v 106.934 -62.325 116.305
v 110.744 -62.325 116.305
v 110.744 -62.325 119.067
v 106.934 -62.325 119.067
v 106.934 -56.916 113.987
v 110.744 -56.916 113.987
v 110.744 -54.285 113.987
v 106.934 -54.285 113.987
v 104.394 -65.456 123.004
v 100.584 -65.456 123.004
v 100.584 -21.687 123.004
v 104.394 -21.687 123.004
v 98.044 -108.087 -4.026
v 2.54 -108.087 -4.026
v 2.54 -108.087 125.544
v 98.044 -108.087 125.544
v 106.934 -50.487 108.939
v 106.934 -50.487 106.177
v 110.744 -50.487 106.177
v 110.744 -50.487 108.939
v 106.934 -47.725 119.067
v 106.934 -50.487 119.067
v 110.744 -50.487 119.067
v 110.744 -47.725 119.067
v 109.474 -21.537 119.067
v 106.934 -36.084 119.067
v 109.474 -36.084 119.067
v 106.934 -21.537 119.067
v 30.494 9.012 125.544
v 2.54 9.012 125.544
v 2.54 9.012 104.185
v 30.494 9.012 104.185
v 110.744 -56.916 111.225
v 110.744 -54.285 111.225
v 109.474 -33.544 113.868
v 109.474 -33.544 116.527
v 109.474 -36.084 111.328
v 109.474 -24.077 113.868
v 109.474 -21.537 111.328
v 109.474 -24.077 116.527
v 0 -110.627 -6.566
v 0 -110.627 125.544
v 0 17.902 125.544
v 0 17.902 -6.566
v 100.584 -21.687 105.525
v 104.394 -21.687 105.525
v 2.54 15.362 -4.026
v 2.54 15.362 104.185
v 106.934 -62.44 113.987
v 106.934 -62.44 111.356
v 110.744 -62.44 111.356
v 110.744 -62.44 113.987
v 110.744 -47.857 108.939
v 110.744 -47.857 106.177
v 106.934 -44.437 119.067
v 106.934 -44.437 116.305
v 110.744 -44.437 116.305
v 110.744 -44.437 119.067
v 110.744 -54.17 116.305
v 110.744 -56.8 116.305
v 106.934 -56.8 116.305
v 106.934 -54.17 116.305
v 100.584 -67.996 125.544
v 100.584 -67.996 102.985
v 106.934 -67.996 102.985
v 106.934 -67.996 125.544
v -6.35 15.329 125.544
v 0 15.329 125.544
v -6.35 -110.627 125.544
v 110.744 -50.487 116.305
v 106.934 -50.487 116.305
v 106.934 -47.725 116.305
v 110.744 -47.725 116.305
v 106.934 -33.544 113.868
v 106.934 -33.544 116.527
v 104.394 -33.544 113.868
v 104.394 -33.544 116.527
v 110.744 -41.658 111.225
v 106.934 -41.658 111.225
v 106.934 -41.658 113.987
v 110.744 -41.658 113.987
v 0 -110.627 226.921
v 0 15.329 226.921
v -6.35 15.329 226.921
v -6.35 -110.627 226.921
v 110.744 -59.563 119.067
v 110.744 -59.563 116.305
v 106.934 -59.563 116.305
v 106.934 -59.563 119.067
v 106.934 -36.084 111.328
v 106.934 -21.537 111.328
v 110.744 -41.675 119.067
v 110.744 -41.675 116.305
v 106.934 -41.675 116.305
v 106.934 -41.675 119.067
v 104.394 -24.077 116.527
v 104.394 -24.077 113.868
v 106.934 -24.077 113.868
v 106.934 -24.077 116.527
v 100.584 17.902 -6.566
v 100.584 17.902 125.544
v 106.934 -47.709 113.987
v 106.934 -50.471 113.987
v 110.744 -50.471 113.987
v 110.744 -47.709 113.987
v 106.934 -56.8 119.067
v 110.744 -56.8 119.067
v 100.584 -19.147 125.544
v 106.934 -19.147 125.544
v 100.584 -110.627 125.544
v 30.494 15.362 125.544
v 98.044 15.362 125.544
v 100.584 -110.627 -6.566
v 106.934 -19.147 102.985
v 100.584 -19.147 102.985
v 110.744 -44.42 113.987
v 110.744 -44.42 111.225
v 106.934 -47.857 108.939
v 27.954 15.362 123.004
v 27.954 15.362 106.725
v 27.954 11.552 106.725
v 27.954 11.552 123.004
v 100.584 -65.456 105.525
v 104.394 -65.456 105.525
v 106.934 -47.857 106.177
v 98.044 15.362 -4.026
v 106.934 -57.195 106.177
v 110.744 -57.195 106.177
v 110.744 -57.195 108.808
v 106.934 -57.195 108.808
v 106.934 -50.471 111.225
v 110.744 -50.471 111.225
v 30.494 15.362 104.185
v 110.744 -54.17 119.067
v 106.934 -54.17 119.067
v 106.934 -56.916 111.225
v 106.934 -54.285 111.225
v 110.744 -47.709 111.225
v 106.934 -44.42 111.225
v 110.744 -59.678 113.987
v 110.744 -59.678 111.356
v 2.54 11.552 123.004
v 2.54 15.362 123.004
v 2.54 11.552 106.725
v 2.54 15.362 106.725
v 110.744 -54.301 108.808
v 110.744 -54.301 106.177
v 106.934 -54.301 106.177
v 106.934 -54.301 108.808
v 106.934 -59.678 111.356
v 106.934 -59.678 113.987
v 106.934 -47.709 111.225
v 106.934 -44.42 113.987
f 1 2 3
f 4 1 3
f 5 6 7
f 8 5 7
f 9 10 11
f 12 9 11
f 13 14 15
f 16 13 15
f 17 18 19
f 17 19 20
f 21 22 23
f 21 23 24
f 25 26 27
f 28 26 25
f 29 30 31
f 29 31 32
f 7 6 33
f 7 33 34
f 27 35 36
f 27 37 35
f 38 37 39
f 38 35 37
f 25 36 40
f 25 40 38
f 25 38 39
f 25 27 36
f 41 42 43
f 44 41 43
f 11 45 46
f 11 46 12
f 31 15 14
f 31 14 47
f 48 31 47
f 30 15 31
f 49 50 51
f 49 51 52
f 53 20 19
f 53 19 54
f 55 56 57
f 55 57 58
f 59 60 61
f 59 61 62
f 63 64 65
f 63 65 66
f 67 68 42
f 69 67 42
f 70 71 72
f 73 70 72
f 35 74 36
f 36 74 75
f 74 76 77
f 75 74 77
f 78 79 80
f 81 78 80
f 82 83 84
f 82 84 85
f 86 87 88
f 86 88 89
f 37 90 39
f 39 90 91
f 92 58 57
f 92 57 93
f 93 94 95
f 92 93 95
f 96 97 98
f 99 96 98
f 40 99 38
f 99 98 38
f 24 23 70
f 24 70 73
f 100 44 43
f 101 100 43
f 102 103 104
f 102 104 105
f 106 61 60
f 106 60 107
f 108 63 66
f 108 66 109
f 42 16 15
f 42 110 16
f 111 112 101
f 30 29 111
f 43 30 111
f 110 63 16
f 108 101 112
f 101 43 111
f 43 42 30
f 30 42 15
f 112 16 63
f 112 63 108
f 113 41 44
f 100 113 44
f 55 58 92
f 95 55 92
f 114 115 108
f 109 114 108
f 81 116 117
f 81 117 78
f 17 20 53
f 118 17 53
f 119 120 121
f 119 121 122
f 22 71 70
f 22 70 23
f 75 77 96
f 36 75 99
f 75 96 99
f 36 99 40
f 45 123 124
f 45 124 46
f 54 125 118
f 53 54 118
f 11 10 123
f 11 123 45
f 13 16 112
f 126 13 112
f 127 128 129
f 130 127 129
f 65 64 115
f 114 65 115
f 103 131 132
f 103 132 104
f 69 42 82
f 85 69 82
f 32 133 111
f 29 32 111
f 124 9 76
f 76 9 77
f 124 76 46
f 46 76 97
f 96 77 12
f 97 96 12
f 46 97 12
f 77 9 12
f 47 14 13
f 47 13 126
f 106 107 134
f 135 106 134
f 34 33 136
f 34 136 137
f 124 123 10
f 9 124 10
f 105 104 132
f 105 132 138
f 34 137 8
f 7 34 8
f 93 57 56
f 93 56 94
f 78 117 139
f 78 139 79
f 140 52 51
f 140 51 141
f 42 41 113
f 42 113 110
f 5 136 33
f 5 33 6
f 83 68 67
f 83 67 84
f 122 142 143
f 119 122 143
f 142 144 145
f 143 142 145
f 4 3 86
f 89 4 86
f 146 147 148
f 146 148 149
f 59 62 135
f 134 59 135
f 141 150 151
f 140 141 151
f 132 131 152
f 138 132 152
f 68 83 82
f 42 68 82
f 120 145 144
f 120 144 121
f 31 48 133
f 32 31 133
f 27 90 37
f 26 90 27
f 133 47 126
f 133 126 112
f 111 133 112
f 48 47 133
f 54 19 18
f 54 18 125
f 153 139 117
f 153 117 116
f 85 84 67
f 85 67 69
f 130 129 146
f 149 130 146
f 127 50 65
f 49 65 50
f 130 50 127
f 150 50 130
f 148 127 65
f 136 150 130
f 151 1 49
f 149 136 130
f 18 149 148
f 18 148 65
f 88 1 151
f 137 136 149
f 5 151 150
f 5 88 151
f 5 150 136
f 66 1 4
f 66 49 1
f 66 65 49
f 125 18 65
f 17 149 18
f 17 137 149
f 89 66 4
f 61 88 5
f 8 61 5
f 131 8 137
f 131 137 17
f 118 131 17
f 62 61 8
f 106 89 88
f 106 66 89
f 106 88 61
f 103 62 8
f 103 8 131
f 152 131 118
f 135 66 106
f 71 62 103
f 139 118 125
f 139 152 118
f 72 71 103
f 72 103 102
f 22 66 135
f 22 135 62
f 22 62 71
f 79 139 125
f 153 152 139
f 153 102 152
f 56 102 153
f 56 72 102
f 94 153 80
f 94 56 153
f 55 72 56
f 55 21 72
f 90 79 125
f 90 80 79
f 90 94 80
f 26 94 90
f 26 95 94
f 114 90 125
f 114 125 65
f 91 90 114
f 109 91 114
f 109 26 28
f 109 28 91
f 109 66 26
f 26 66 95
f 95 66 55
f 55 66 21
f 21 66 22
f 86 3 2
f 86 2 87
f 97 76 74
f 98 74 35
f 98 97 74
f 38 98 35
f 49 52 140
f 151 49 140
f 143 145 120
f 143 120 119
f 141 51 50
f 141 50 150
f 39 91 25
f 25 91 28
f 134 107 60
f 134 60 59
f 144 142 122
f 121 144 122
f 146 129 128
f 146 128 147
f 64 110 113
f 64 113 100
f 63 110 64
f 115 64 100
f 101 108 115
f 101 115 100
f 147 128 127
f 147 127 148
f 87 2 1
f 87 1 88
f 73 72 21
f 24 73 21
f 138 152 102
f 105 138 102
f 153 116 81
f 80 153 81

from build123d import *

# Parameters (mm, degrees)
F0_W          = 128.5288762301
F0_H          = 132.1100722998
F1_DEPTH      = 100.584
F2_T          = -2.54
F3_W          = 125.9559132159
F3_H          = 101.376414299
F4_DEPTH      = 6.35
F5_W          = 27.9540398782
F5_H          = 21.3589221239
F6_DEPTH      = 6.35
F7_W          = 48.8489195704
F7_H          = 22.5596278906
F8_DEPTH      = 6.35
F9_W          = 2.762068063
F9_H          = 2.7620643377
F9_W_2        = 2.6305429637
F9_H_2        = 2.7620717883
F9_W_3        = 2.7620717883
F9_W_4        = 2.630546689
F9_W_5        = 2.8935968876
F9_H_3        = 2.630546689
F9_H_4        = 2.6305392385
F10_DEPTH     = 3.81
F11_W         = 15.6517345458
F11_H         = 4.7349780798
F12_DEPTH     = 5.08
F13_W         = 14.5478118211
F13_H         = 7.7390819788
F14_DEPTH     = 2.54
F15_T         = 2.54
F15_T3_DEPTH  = 27.6396278906
F15_T5_DEPTH  = 53.9289195704
F15_T7_DEPTH  = 7.9735968876
F15_T9_DEPTH  = 7.710546689
F15_T11_DEPTH = 7.710546689
F15_T13_DEPTH = 7.8420717883
F15_T15_DEPTH = 7.7105429637
F15_T17_DEPTH = 7.8420717883
F15_T19_DEPTH = 7.8420717883
F15_T21_DEPTH = 7.842068063
F15_T23_DEPTH = 7.842068063
F15_T25_DEPTH = 7.7105392385
F15_T27_DEPTH = 7.842068063
F15_T29_DEPTH = 7.8420643377
F15_T31_DEPTH = 7.7105429637
F15_T33_DEPTH = 7.8420717883
F15_T35_DEPTH = 7.8420717883
F15_T37_DEPTH = 7.842068063
F15_T39_DEPTH = 19.6278118211
F15_T41_DEPTH = 12.8190819788
F15_T43_DEPTH = 134.6500722998
F15_T45_DEPTH = 100.584
F15_T47_DEPTH = 113.2911501759
F15_T49_DEPTH = 33.0340398782
F15_T51_DEPTH = 26.4389221239
F15_T53_DEPTH = 11.43
F15_T55_DEPTH = 128.5288762301


# Not quite as in the source:
# - a shell that OpenCascade refuses in one call is made with other operations: the cavity is built on its own and cut out


with BuildPart() as f1:
    # F0 (on Right) → F1 (new body)
    with BuildSketch(Plane.YZ):
        with Locations((-46.36219237, 59.4891095534)):
            Rectangle(F0_W, F0_H)
    extrude(amount=F1_DEPTH)

    # F2
    f2_openings = [f1.faces().sort_by_distance(p)[0] for p in [
        (50.292, -46.362192, 125.544146),
    ]]
    offset(amount=F2_T, openings=f2_openings)

    # F5 (on face) → F6 (join)
    with BuildSketch(Plane.XZ.offset(-15.3622457451)):
        with Locations((16.5170199391, 114.8646846414)):
            Rectangle(F5_W, F5_H)
    extrude(amount=F6_DEPTH)

    # F7 (on face) → F8 (join)
    with BuildSketch(Plane.YZ.offset(100.584)):
        with Locations((-43.5713417828, 114.264331758)):
            Rectangle(F7_W, F7_H)
    extrude(amount=F8_DEPTH)

    # F9 (on face) → F10 (join)
    with BuildSketch(Plane.YZ.offset(106.934)):
        with Locations((-60.9435793012, 117.6858767867)):
            Rectangle(F9_W, F9_H)
        with Locations((-55.4852019995, 117.6858730614)):
            Rectangle(F9_W_2, F9_H_2)
        with Locations((-49.1061359644, 117.6858730614)):
            Rectangle(F9_W_3, F9_H_2)
        with Locations((-43.0558864027, 117.6858730614)):
            Rectangle(F9_W, F9_H_2)
        with Locations((-43.0394452997, 112.6056425273)):
            Rectangle(F9_W, F9_H_2)
        with Locations((-49.0896948613, 112.6056425273)):
            Rectangle(F9_W_3, F9_H_2)
        with Locations((-49.171898514, 107.5582839549)):
            Rectangle(F9_W_4, F9_H_2)
        with Locations((-55.748257786, 107.4925214052)):
            Rectangle(F9_W_5, F9_H_3)
        with Locations((-55.600289721, 112.6056425273)):
            Rectangle(F9_W_2, F9_H_2)
        with Locations((-61.0586670227, 112.6714088023)):
            Rectangle(F9_W, F9_H_4)
    extrude(amount=F10_DEPTH)

    # F11 (on face) → F12 (join)
    with BuildSketch(Plane.YZ.offset(106.934)):
        with Locations((-28.7194242701, 116.8309524655)):
            Rectangle(F11_W, F11_H)
    extrude(amount=-F12_DEPTH)

    # F13 (on face) → F14 (join)
    with BuildSketch(Plane.YZ.offset(106.934)):
        with Locations((-28.8104629144, 115.1973679662)):
            Rectangle(F13_W, F13_H)
    extrude(amount=F14_DEPTH)

    # F15: shell of thickness 2.54, made by hand


with BuildPart() as f4:
    # F3 (on face) → F4 (new body)
    with BuildSketch(Plane(origin=(0, 0, 0), x_dir=(0, -1, 0), z_dir=(-1, 0, 0))):
        with Locations((47.6486738771, 176.2323528528)):
            Rectangle(F3_W, F3_H)
    extrude(amount=F4_DEPTH)


with BuildPart() as f15_core1:
    # F15_t2: copy of F1
    add(f1.part)

    # the walls: a layer under each face that stays
    f15_faces = [f15_core1.faces().sort_by_distance(p)[0] for p in [
        (50.292, -110.6266304851, 59.4891095534),
        (99.2958571429, 8.7216117286, 125.5441457033),
        (50.292, -46.36219237, -6.5659265965),
        (0, -46.36219237, 59.4891095534),
        (100.584, -46.36219237, 59.4891095534),
        (50.292, 17.9022457451, 59.4891095534),
        (103.759, -19.1468819976, 114.264331758),
        (106.934, -43.5713417828, 114.264331758),
        (103.759, -67.995801568, 114.264331758),
        (50.292, 15.3622457451, 60.7591095534),
        (30.4940398782, 12.1872457451, 114.8646846414),
        (16.5170199391, 9.0122457451, 114.8646846414),
        (2.54, -46.36219237, 60.7591095534),
        (50.292, -108.0866304851, 60.7591095534),
        (98.044, -46.36219237, 60.7591095534),
        (103.759, -43.5713417828, 102.9845178127),
        (108.839, -55.748257786, 108.8077947497),
        (108.839, -54.3014593422, 107.4925214052),
        (108.839, -57.1950562298, 107.4925214052),
        (108.839, -55.748257786, 106.1772480607),
        (108.839, -49.171898514, 108.939319849),
        (108.839, -47.8566251695, 107.5582839549),
        (108.839, -50.4871718585, 107.5582839549),
        (108.839, -49.171898514, 106.1772480607),
        (108.839, -55.600289721, 113.9866784215),
        (108.839, -54.2850182392, 112.6056425273),
        (108.839, -56.9155612029, 112.6056425273),
        (108.839, -55.600289721, 111.2246066332),
        (108.839, -49.0896948613, 113.9866784215),
        (108.839, -47.7086589672, 112.6056425273),
        (108.839, -50.4707307555, 112.6056425273),
        (108.839, -49.0896948613, 111.2246066332),
        (108.839, -43.0394452997, 113.9866784215),
        (108.839, -41.6584112681, 112.6056425273),
        (108.839, -44.4204793312, 112.6056425273),
        (108.839, -43.0394452997, 111.2246066332),
        (108.839, -61.0586670227, 111.356139183),
        (108.839, -62.4397010542, 112.6714088023),
        (108.839, -59.6776329912, 112.6714088023),
        (108.839, -61.0586670227, 113.9866784215),
        (108.839, -60.9435793012, 119.0669089556),
        (108.839, -59.5625452697, 117.6858767867),
        (108.839, -62.3246133327, 117.6858767867),
        (108.839, -60.9435793012, 116.3048446178),
        (108.839, -55.4852019995, 119.0669089556),
        (108.839, -54.1699305177, 117.6858730614),
        (108.839, -56.8004734814, 117.6858730614),
        (108.839, -55.4852019995, 116.3048371673),
        (108.839, -49.1061359644, 119.0669089556),
        (108.839, -47.7251000702, 117.6858730614),
        (108.839, -50.4871718585, 117.6858730614),
        (108.839, -49.1061359644, 116.3048371673),
        (108.839, -43.0558864027, 119.0669089556),
        (108.839, -41.6748523712, 117.6858730614),
        (108.839, -44.4369204342, 117.6858730614),
        (108.839, -43.0558864027, 116.3048371673),
        (108.204, -28.8104629144, 119.0669089556),
        (108.204, -36.084368825, 115.1973679662),
        (108.204, -28.8104629144, 111.3278269768),
        (108.204, -21.5365570039, 115.1973679662),
        (50.292, -46.36219237, -4.0259265965),
        (16.5170199391, 12.1872457451, 104.1852235794),
        (110.744, -55.748257786, 107.4925214052),
        (110.744, -49.171898514, 107.5582839549),
        (110.744, -55.600289721, 112.6056425273),
        (110.744, -49.0896948613, 112.6056425273),
        (110.744, -43.0394452997, 112.6056425273),
        (110.744, -61.0586670227, 112.6714088023),
        (110.744, -60.9435793012, 117.6858767867),
        (110.744, -55.4852019995, 117.6858730614),
        (110.744, -49.1061359644, 117.6858730614),
        (110.744, -43.0558864027, 117.6858730614),
    ]]
    thicken(f15_faces, amount=-F15_T, mode=Mode.SUBTRACT)

    # F15_s4 → F15_t3 (cut)
    with BuildSketch(Plane.XY.offset(100.4445178127)):
        Polygon((100.6094, -68.021201568), (98.044, -67.995801568), (98.044, -65.455801568), (100.584, -65.455801568), align=None)
        Polygon((100.6094, -19.1214819976), (98.044, -19.1468819976), (98.044, -21.6868819976), (100.584, -21.6868819976), align=None)
    extrude(amount=F15_T3_DEPTH, mode=Mode.SUBTRACT)

    # F15_s6 → F15_t5 (cut)
    with BuildSketch(Plane.XZ.offset(16.6068819976)):
        Polygon((100.6094, 102.9591178127), (98.044, 102.9845178127), (98.044, 105.5245178127), (100.584, 105.5245178127), align=None)
    extrude(amount=F15_T5_DEPTH, mode=Mode.SUBTRACT)

    # F15_s8 → F15_t7 (cut)
    with BuildSketch(Plane.XZ.offset(51.7614593422)):
        Polygon((106.9594, 108.8331947497), (104.394, 108.8077947497), (104.394, 106.2677947497), (106.934, 106.2677947497), align=None)
        Polygon((106.9594, 106.1518480607), (104.394, 106.1772480607), (104.394, 108.7172480607), (106.934, 108.7172480607), align=None)
    extrude(amount=F15_T7_DEPTH, mode=Mode.SUBTRACT)

    # F15_s10 → F15_t9 (cut)
    with BuildSketch(Plane.XY.offset(103.6372480607)):
        Polygon((106.9594, -54.2760593422), (104.394, -54.3014593422), (104.394, -56.8414593422), (106.934, -56.8414593422), align=None)
        Polygon((106.9594, -57.2204562298), (104.394, -57.1950562298), (104.394, -54.6550562298), (106.934, -54.6550562298), align=None)
    extrude(amount=F15_T9_DEPTH, mode=Mode.SUBTRACT)

    # F15_s12 → F15_t11 (cut)
    with BuildSketch(Plane.XZ.offset(45.3166251695)):
        Polygon((106.9594, 108.964719849), (104.394, 108.939319849), (104.394, 106.399319849), (106.934, 106.399319849), align=None)
        Polygon((106.9594, 106.1518480607), (104.394, 106.1772480607), (104.394, 108.7172480607), (106.934, 108.7172480607), align=None)
    extrude(amount=F15_T11_DEPTH, mode=Mode.SUBTRACT)

    # F15_s14 → F15_t13 (cut)
    with BuildSketch(Plane.XY.offset(103.6372480607)):
        Polygon((106.9594, -47.8312251695), (104.394, -47.8566251695), (104.394, -50.3966251695), (106.934, -50.3966251695), align=None)
        Polygon((106.9594, -50.5125718585), (104.394, -50.4871718585), (104.394, -47.9471718585), (106.934, -47.9471718585), align=None)
    extrude(amount=F15_T13_DEPTH, mode=Mode.SUBTRACT)

    # F15_s16 → F15_t15 (cut)
    with BuildSketch(Plane.XZ.offset(51.7450182392)):
        Polygon((106.9594, 114.0120784215), (104.394, 113.9866784215), (104.394, 111.4466784215), (106.934, 111.4466784215), align=None)
        Polygon((106.9594, 111.1992066332), (104.394, 111.2246066332), (104.394, 113.7646066332), (106.934, 113.7646066332), align=None)
    extrude(amount=F15_T15_DEPTH, mode=Mode.SUBTRACT)

    # F15_s18 → F15_t17 (cut)
    with BuildSketch(Plane.XY.offset(108.6846066332)):
        Polygon((106.9594, -54.2596182392), (104.394, -54.2850182392), (104.394, -56.8250182392), (106.934, -56.8250182392), align=None)
        Polygon((106.9594, -56.9409612029), (104.394, -56.9155612029), (104.394, -54.3755612029), (106.934, -54.3755612029), align=None)
        Polygon((106.9594, -47.6832589672), (104.394, -47.7086589672), (104.394, -50.2486589672), (106.934, -50.2486589672), align=None)
        Polygon((106.9594, -50.4961307555), (104.394, -50.4707307555), (104.394, -47.9307307555), (106.934, -47.9307307555), align=None)
        Polygon((106.9594, -41.6330112681), (104.394, -41.6584112681), (104.394, -44.1984112681), (106.934, -44.1984112681), align=None)
        Polygon((106.9594, -44.4458793312), (104.394, -44.4204793312), (104.394, -41.8804793312), (106.934, -41.8804793312), align=None)
    extrude(amount=F15_T17_DEPTH, mode=Mode.SUBTRACT)

    # F15_s20 → F15_t19 (cut)
    with BuildSketch(Plane.XZ.offset(45.1686589672)):
        Polygon((106.9594, 114.0120784215), (104.394, 113.9866784215), (104.394, 111.4466784215), (106.934, 111.4466784215), align=None)
        Polygon((106.9594, 111.1992066332), (104.394, 111.2246066332), (104.394, 113.7646066332), (106.934, 113.7646066332), align=None)
    extrude(amount=F15_T19_DEPTH, mode=Mode.SUBTRACT)

    # F15_s22 → F15_t21 (cut)
    with BuildSketch(Plane.XZ.offset(39.1184112681)):
        Polygon((106.9594, 114.0120784215), (104.394, 113.9866784215), (104.394, 111.4466784215), (106.934, 111.4466784215), align=None)
        Polygon((106.9594, 111.1992066332), (104.394, 111.2246066332), (104.394, 113.7646066332), (106.934, 113.7646066332), align=None)
    extrude(amount=F15_T21_DEPTH, mode=Mode.SUBTRACT)

    # F15_s24 → F15_t23 (cut)
    with BuildSketch(Plane.XZ.offset(57.1376329912)):
        Polygon((106.9594, 111.330739183), (104.394, 111.356139183), (104.394, 113.896139183), (106.934, 113.896139183), align=None)
        Polygon((106.9594, 114.0120784215), (104.394, 113.9866784215), (104.394, 111.4466784215), (106.934, 111.4466784215), align=None)
    extrude(amount=F15_T23_DEPTH, mode=Mode.SUBTRACT)

    # F15_s26 → F15_t25 (cut)
    with BuildSketch(Plane.XY.offset(108.816139183)):
        Polygon((106.9594, -62.4651010542), (104.394, -62.4397010542), (104.394, -59.8997010542), (106.934, -59.8997010542), align=None)
        Polygon((106.9594, -59.6522329912), (104.394, -59.6776329912), (104.394, -62.2176329912), (106.934, -62.2176329912), align=None)
    extrude(amount=F15_T25_DEPTH, mode=Mode.SUBTRACT)

    # F15_s28 → F15_t27 (cut)
    with BuildSketch(Plane.XZ.offset(57.0225452697)):
        Polygon((106.9594, 119.0923089556), (104.394, 119.0669089556), (104.394, 116.5269089556), (106.934, 116.5269089556), align=None)
        Polygon((106.9594, 116.2794446178), (104.394, 116.3048446178), (104.394, 118.8448446178), (106.934, 118.8448446178), align=None)
    extrude(amount=F15_T27_DEPTH, mode=Mode.SUBTRACT)

    # F15_s30 → F15_t29 (cut)
    with BuildSketch(Plane.XY.offset(113.7648446178)):
        Polygon((106.9594, -59.5371452697), (104.394, -59.5625452697), (104.394, -62.1025452697), (106.934, -62.1025452697), align=None)
        Polygon((106.9594, -62.3500133327), (104.394, -62.3246133327), (104.394, -59.7846133327), (106.934, -59.7846133327), align=None)
    extrude(amount=F15_T29_DEPTH, mode=Mode.SUBTRACT)

    # F15_s32 → F15_t31 (cut)
    with BuildSketch(Plane.XZ.offset(51.6299305177)):
        Polygon((106.9594, 119.0923089556), (104.394, 119.0669089556), (104.394, 116.5269089556), (106.934, 116.5269089556), align=None)
        Polygon((106.9594, 116.2794371673), (104.394, 116.3048371673), (104.394, 118.8448371673), (106.934, 118.8448371673), align=None)
    extrude(amount=F15_T31_DEPTH, mode=Mode.SUBTRACT)

    # F15_s34 → F15_t33 (cut)
    with BuildSketch(Plane.XY.offset(113.7648371673)):
        Polygon((106.9594, -54.1445305177), (104.394, -54.1699305177), (104.394, -56.7099305177), (106.934, -56.7099305177), align=None)
        Polygon((106.9594, -56.8258734814), (104.394, -56.8004734814), (104.394, -54.2604734814), (106.934, -54.2604734814), align=None)
        Polygon((106.9594, -47.6997000702), (104.394, -47.7251000702), (104.394, -50.2651000702), (106.934, -50.2651000702), align=None)
        Polygon((106.9594, -50.5125718585), (104.394, -50.4871718585), (104.394, -47.9471718585), (106.934, -47.9471718585), align=None)
        Polygon((106.9594, -41.6494523712), (104.394, -41.6748523712), (104.394, -44.2148523712), (106.934, -44.2148523712), align=None)
        Polygon((106.9594, -44.4623204342), (104.394, -44.4369204342), (104.394, -41.8969204342), (106.934, -41.8969204342), align=None)
    extrude(amount=F15_T33_DEPTH, mode=Mode.SUBTRACT)

    # F15_s36 → F15_t35 (cut)
    with BuildSketch(Plane.XZ.offset(45.1851000702)):
        Polygon((106.9594, 119.0923089556), (104.394, 119.0669089556), (104.394, 116.5269089556), (106.934, 116.5269089556), align=None)
        Polygon((106.9594, 116.2794371673), (104.394, 116.3048371673), (104.394, 118.8448371673), (106.934, 118.8448371673), align=None)
    extrude(amount=F15_T35_DEPTH, mode=Mode.SUBTRACT)

    # F15_s38 → F15_t37 (cut)
    with BuildSketch(Plane.XZ.offset(39.1348523712)):
        Polygon((106.9594, 119.0923089556), (104.394, 119.0669089556), (104.394, 116.5269089556), (106.934, 116.5269089556), align=None)
        Polygon((106.9594, 116.2794371673), (104.394, 116.3048371673), (104.394, 118.8448371673), (106.934, 118.8448371673), align=None)
    extrude(amount=F15_T37_DEPTH, mode=Mode.SUBTRACT)

    # F15_s40 → F15_t39 (cut)
    with BuildSketch(Plane.XZ.offset(18.9965570039)):
        Polygon((106.9594, 119.0923089556), (104.394, 119.0669089556), (104.394, 116.5269089556), (106.934, 116.5269089556), align=None)
        Polygon((106.9594, 111.3024269768), (104.394, 111.3278269768), (104.394, 113.8678269768), (106.934, 113.8678269768), align=None)
    extrude(amount=F15_T39_DEPTH, mode=Mode.SUBTRACT)

    # F15_s42 → F15_t41 (cut)
    with BuildSketch(Plane.XY.offset(108.7878269768)):
        Polygon((106.9594, -36.109768825), (104.394, -36.084368825), (104.394, -33.544368825), (106.934, -33.544368825), align=None)
        Polygon((106.9594, -21.5111570039), (104.394, -21.5365570039), (104.394, -24.0765570039), (106.934, -24.0765570039), align=None)
    extrude(amount=F15_T41_DEPTH, mode=Mode.SUBTRACT)

    # F15_s44 → F15_t43 (cut)
    with BuildSketch(Plane.XY.offset(-6.5659265965)):
        Polygon((98.0186, 15.3368457451), (98.044, 17.9022457451), (100.584, 17.9022457451), (100.584, 15.3622457451), align=None)
        Polygon((2.5654, -108.0612304851), (0, -108.0866304851), (0, -110.6266304851), (2.54, -110.6266304851), align=None)
        Polygon((98.0186, -108.0612304851), (98.044, -110.6266304851), (100.584, -110.6266304851), (100.584, -108.0866304851), align=None)
    extrude(amount=F15_T43_DEPTH, mode=Mode.SUBTRACT)

    # F15_s46 → F15_t45 (cut)
    with BuildSketch(Plane.YZ):
        Polygon((15.3368457451, -4.0005265965), (17.9022457451, -4.0259265965), (17.9022457451, -6.5659265965), (15.3622457451, -6.5659265965), align=None)
        Polygon((-108.0612304851, -4.0005265965), (-110.6266304851, -4.0259265965), (-110.6266304851, -6.5659265965), (-108.0866304851, -6.5659265965), align=None)
    extrude(amount=F15_T45_DEPTH, mode=Mode.SUBTRACT)

    # F15_s48 → F15_t47 (cut)
    with BuildSketch(Plane.XY.offset(-6.5659265965)):
        Polygon((2.5654, 15.3368457451), (2.54, 17.9022457451), (0, 17.9022457451), (0, 15.3622457451), align=None)
    extrude(amount=F15_T47_DEPTH, mode=Mode.SUBTRACT)

    # F15_s50 → F15_t49 (cut)
    with BuildSketch(Plane.YZ):
        Polygon((15.3368457451, 104.1598235794), (17.9022457451, 104.1852235794), (17.9022457451, 106.7252235794), (15.3622457451, 106.7252235794), align=None)
    extrude(amount=F15_T49_DEPTH, mode=Mode.SUBTRACT)

    # F15_s52 → F15_t51 (cut)
    with BuildSketch(Plane.XY.offset(101.6452235794)):
        Polygon((30.5194398782, 15.3368457451), (30.4940398782, 17.9022457451), (27.9540398782, 17.9022457451), (27.9540398782, 15.3622457451), align=None)
        Polygon((2.5654, 8.9868457451), (2.54, 11.5522457451), (0, 11.5522457451), (0, 9.0122457451), align=None)
    extrude(amount=F15_T51_DEPTH, mode=Mode.SUBTRACT)

    # F15_s54 → F15_t53 (cut)
    with BuildSketch(Plane.XZ.offset(-17.9022457451)):
        Polygon((2.5654, 104.1598235794), (0, 104.1852235794), (0, 106.7252235794), (2.54, 106.7252235794), align=None)
    extrude(amount=F15_T53_DEPTH, mode=Mode.SUBTRACT)

    # F15_s56 → F15_t55 (cut)
    with BuildSketch(Plane.XZ.offset(-17.9022457451)):
        Polygon((2.5654, -4.0005265965), (0, -4.0259265965), (0, -6.5659265965), (2.54, -6.5659265965), align=None)
        Polygon((98.0186, -4.0005265965), (100.584, -4.0259265965), (100.584, -6.5659265965), (98.044, -6.5659265965), align=None)
    extrude(amount=F15_T55_DEPTH, mode=Mode.SUBTRACT)


with BuildPart() as f1_1:
    add(f1.part)

    # what is left inside the walls is the cavity
    f15_cavity = [f15_core1.part.solids().sort_by_distance(p)[0] for p in [
        (15.24702, 11.577646, 112.151531),
        (100.6094, -43.571342, 111.35106),
    ]]
    add(f15_cavity, mode=Mode.SUBTRACT)


solid = Compound([f4.part, f1_1.part])
